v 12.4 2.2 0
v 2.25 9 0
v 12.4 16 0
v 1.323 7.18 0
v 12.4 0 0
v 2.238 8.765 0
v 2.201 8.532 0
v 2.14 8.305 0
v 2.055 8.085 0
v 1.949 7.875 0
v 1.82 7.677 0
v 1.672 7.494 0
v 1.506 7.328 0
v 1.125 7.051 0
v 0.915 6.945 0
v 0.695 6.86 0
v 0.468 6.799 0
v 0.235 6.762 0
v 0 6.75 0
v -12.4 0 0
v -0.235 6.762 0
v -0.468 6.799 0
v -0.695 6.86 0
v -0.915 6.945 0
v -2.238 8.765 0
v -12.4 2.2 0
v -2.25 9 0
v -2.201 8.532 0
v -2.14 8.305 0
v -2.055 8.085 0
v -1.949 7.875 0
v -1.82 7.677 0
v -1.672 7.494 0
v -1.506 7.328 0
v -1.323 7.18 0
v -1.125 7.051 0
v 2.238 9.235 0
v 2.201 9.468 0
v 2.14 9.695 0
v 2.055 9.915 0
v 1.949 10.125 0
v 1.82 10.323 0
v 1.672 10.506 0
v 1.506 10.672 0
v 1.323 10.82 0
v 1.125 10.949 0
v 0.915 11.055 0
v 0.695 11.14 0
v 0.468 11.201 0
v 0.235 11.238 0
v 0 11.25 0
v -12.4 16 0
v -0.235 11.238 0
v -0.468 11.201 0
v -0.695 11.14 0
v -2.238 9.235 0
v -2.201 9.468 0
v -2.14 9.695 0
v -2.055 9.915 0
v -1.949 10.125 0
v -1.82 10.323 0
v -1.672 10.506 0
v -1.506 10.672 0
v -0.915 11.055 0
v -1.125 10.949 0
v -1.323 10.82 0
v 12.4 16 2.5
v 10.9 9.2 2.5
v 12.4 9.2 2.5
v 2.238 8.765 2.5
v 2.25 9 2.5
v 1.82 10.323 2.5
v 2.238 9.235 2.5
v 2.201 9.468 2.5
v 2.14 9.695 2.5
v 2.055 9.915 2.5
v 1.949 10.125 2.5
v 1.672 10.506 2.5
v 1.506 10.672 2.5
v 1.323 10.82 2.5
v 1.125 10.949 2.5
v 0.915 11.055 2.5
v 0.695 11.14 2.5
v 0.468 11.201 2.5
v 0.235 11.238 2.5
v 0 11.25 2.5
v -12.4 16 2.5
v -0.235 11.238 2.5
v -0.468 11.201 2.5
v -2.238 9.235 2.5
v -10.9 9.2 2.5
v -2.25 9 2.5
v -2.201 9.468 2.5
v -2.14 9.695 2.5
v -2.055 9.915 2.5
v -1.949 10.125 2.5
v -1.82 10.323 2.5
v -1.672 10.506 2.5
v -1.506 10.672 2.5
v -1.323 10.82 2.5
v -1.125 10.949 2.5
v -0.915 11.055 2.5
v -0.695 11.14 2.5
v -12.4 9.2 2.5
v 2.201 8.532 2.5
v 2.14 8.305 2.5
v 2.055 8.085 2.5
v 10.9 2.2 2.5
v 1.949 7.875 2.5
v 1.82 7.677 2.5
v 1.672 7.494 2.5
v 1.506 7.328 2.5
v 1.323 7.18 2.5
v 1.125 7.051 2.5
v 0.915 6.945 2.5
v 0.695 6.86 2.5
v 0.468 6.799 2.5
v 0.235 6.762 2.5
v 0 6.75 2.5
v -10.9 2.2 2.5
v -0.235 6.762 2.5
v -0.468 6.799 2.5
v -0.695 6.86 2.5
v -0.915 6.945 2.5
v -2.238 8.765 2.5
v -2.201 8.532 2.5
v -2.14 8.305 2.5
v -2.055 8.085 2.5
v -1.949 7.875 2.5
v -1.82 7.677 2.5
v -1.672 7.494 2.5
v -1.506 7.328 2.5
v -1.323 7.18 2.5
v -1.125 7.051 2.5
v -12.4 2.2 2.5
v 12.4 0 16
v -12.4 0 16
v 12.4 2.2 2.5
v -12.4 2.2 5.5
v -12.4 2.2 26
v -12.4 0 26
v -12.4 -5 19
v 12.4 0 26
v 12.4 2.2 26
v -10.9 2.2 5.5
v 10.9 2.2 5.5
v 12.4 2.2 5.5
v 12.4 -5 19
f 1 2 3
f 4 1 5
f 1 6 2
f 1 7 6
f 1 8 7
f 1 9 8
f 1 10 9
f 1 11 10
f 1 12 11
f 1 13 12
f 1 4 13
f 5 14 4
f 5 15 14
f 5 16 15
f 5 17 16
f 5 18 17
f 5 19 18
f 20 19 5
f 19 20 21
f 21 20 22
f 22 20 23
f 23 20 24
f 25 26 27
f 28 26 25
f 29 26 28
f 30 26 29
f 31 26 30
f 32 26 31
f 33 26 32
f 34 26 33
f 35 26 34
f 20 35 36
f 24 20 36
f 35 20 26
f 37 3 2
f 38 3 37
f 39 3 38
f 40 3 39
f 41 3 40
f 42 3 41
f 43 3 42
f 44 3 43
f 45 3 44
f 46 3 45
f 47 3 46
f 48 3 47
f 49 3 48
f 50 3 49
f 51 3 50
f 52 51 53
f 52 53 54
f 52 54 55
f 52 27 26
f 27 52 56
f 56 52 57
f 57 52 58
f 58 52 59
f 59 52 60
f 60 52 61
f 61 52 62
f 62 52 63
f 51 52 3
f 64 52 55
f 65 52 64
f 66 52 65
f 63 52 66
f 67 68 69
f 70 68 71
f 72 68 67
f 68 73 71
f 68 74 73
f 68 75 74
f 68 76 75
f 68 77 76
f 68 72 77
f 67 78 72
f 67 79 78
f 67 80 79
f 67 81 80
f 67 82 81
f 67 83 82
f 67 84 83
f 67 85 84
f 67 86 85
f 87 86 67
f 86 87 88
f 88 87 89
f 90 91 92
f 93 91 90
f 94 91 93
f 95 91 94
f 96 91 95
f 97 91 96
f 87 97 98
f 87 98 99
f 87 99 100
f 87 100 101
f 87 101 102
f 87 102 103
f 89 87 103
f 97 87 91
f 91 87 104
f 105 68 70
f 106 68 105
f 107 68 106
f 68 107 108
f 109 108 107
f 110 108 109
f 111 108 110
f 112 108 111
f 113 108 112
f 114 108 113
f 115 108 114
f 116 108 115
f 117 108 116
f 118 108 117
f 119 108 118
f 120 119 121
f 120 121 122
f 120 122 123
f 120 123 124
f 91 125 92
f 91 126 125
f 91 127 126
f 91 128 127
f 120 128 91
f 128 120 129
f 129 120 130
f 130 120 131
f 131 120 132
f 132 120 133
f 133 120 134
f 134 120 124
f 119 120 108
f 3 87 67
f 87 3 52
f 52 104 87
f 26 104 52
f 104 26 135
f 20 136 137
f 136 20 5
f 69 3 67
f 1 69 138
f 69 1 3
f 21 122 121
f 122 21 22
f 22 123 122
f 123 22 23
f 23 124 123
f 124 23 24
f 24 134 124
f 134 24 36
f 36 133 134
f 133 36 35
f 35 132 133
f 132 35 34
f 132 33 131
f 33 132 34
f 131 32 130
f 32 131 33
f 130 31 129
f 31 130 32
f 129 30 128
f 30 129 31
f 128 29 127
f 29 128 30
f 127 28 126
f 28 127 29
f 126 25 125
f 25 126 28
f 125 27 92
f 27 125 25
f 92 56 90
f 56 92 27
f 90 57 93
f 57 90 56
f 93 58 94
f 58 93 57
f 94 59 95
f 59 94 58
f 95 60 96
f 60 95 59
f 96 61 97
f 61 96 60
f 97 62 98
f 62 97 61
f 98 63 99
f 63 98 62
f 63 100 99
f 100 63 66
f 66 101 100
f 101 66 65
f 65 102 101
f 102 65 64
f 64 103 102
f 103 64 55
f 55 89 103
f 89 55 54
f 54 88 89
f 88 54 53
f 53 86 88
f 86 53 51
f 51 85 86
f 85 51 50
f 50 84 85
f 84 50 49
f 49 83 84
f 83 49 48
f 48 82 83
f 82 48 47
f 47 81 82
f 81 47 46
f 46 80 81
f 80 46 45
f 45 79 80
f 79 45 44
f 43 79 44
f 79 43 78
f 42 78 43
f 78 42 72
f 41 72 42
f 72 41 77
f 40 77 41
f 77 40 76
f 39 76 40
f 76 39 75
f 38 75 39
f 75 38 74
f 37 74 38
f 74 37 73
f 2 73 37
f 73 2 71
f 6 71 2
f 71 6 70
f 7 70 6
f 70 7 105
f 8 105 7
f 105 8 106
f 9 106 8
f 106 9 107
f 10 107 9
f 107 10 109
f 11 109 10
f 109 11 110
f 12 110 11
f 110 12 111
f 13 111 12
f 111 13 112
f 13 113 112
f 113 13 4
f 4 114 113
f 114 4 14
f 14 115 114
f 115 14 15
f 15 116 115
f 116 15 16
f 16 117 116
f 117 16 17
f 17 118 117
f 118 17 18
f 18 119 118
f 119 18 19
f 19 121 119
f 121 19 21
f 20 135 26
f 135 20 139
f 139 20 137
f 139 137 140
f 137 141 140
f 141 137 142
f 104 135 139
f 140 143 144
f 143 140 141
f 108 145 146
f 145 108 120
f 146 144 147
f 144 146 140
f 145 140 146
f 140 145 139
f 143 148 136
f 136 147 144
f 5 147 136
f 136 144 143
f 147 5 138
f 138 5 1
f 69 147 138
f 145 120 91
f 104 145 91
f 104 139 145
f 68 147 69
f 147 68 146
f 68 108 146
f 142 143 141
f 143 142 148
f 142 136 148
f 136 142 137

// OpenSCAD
width = 24.8;

module base() {
  linear_extrude(2.5) {
    difference() {
      translate([width/-2,0,0]) square([width,16]);
      translate([0,9,0]) circle(4.5/2, $fn=60);
    }
  }
  linear_extrude(26) {
    translate([width/-2, 0, 0]) square([width, 2.2]);
  }
}
module support() {
  rotate([0,-90,0]) {
    linear_extrude(1.5) {
      polygon([[0,0],[0,7],[3,0]]);
    }
  }
}

module clip() {
  rotate([0, -90, 180]) {
    linear_extrude(width) {
      polygon([[10,0],[3,5],[0,0]]);
    }
  }
}

base();
translate([width/-2 + 1.5, 2.2, 2.5]) support();
translate([width/2, 2.2, 2.5]) support();
translate([width/-2,0,26-10]) clip();
